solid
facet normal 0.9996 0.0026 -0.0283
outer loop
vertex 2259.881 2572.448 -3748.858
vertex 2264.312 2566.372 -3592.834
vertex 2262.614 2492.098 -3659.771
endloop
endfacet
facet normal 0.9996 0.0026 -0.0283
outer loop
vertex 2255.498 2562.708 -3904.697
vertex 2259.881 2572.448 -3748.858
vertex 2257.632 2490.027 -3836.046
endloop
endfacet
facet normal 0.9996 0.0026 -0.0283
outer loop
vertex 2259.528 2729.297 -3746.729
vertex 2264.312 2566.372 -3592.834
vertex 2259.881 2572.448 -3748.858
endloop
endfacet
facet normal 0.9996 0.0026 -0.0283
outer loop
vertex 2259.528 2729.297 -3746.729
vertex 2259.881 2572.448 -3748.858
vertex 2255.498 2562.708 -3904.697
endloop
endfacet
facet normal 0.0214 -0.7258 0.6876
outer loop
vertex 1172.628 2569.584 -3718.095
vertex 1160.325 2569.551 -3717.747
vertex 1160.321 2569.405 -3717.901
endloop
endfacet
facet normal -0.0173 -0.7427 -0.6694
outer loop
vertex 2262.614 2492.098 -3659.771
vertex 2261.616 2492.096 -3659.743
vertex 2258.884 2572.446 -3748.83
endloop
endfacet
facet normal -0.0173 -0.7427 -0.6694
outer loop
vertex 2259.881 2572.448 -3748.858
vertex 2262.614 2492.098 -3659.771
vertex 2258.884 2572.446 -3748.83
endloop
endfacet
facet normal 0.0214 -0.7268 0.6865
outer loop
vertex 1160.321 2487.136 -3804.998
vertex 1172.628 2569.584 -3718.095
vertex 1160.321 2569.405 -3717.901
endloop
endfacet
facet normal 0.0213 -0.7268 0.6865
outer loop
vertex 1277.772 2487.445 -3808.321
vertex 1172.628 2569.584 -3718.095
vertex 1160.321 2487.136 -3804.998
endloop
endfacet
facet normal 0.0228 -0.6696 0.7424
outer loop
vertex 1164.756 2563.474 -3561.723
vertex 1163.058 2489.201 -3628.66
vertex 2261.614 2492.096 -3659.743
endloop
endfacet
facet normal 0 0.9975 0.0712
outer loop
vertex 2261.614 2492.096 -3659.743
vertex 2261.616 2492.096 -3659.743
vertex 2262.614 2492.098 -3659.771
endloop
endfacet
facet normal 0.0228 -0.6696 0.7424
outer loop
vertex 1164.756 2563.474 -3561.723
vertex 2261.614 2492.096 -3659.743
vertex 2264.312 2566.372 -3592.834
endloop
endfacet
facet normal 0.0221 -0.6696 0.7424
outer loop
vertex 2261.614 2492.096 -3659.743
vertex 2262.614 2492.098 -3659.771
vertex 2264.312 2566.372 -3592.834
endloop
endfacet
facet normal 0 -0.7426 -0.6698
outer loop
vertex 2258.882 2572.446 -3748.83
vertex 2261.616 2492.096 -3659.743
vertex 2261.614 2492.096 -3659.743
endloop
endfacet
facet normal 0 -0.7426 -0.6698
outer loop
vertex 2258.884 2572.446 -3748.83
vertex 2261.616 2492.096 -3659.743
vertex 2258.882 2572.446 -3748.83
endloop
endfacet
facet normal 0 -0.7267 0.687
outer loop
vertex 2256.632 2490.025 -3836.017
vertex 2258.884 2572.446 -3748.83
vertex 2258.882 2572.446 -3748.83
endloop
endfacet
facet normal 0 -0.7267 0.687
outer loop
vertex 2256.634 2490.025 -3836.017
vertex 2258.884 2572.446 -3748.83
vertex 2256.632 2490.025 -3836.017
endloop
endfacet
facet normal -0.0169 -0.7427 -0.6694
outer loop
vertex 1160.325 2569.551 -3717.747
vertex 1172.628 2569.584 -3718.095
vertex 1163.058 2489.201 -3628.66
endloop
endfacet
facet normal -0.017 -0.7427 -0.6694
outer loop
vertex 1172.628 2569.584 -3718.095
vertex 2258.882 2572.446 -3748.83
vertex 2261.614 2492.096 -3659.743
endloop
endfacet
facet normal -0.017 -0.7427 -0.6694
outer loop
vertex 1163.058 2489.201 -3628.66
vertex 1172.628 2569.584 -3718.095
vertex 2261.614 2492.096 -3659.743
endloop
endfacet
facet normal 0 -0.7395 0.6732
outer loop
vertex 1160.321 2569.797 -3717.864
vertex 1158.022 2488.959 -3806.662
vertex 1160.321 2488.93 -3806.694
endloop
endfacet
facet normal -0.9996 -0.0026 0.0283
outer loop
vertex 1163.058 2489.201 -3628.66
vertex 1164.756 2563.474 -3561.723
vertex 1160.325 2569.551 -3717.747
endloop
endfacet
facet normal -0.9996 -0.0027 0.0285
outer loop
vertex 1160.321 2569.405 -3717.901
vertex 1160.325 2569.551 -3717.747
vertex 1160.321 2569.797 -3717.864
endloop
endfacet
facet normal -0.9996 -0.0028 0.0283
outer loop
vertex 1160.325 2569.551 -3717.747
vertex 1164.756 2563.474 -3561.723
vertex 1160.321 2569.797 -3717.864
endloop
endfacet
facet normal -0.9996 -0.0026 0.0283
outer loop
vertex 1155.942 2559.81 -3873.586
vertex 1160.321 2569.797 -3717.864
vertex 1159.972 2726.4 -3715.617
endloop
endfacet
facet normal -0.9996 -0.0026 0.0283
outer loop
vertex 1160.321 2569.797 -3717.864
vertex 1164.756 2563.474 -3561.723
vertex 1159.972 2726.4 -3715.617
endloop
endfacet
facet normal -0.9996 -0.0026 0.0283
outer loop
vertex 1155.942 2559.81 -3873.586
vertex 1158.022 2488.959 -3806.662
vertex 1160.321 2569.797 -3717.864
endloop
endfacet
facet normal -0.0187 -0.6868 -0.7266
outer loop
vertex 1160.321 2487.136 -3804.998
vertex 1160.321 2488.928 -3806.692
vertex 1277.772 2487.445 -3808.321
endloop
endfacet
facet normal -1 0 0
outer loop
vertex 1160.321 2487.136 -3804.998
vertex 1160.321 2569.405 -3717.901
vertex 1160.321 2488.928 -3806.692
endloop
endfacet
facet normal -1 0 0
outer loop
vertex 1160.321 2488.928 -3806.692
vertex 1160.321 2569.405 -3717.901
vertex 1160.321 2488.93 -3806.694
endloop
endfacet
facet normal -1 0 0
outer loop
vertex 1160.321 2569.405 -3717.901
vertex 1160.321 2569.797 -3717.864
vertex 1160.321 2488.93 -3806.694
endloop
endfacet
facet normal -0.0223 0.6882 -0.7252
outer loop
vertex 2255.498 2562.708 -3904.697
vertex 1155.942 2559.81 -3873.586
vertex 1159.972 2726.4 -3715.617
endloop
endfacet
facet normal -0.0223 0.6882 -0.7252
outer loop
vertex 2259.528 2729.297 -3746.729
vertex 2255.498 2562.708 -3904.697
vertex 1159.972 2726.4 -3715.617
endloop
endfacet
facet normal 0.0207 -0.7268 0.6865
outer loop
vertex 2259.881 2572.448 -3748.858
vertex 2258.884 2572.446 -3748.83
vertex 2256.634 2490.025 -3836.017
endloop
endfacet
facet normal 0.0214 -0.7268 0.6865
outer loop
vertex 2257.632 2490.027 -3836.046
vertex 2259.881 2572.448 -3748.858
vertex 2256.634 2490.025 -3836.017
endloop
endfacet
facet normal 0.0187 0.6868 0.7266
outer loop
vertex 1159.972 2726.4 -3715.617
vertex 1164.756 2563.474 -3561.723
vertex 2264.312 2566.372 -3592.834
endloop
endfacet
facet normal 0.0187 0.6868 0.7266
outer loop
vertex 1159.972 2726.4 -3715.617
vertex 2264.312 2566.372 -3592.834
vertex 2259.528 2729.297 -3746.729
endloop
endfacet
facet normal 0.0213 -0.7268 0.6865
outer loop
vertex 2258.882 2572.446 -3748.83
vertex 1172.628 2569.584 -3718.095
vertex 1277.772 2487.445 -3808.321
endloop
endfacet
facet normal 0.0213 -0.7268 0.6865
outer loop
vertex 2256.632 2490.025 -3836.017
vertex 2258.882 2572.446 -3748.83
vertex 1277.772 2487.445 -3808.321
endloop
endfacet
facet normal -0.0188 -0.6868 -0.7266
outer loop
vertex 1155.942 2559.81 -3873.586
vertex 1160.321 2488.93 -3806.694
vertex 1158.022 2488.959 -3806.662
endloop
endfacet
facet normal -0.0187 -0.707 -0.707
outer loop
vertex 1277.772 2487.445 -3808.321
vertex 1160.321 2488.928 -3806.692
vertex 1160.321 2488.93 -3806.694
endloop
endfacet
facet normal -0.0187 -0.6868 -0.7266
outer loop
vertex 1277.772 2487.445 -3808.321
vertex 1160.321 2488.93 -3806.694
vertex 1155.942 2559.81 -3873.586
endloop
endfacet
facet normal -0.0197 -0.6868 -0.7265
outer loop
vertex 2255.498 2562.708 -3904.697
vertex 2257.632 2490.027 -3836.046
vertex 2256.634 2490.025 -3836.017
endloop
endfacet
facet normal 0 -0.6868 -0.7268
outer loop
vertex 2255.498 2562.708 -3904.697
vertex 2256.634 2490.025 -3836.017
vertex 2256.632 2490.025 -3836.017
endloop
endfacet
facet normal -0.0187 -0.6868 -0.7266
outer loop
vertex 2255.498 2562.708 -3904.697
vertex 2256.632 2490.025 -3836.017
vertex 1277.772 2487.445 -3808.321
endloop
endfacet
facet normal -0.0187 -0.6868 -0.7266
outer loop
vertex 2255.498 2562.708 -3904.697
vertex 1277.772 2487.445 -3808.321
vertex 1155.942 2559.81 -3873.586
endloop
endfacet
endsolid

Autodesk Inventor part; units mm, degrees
sketch "Sketch1" plane through (0, 0, 0) normal (0, 0, 1) x (1, 0, 0)
  line L0 (2948.6488, 634.5525) -> (2841.4489, 559.4904)
  line L1 (2841.4489, 559.4904) -> (2956.2003, 395.6085)
  line L2 (2956.2003, 395.6085) -> (3063.4001, 470.6706)
  line L3 (1051.1773, 2444.1167) -> (976.8907, 2338.0244)
  line L4 (976.8907, 2338.0244) -> (1140.7211, 2223.3091)
  line L5 (1140.7211, 2223.3091) -> (1215.0077, 2329.4014)
  line L6 (-383.8501, 3232.1868) -> (-383.8501, 3052.6308)
  arc A0 (4065.9398, -2152.4924) -> (-383.8501, 3052.6308) centre (-4485.4868, -4958.3977) ccw
  arc A1 (1051.1773, 2444.1167) -> (-383.8501, 3232.1868) centre (-3980.604, -5017.8654) ccw
  arc A2 (2948.6488, 634.5525) -> (1215.0077, 2329.4014) centre (-4152.392, -4894.9339) ccw
  arc A3 (4300.883, -1939.8955) -> (3063.4001, 470.6706) centre (-4233.2291, -4798.0297) ccw
  arc A4 (4065.9398, -2152.4924) -> (4300.883, -1939.8955) centre (3657.2708, -1464.7499) ccw
  point P0 (0, 0)
  point P1 (4065.924, -2152.4924)
  point P2 (4065.924, -2152.4924)
  dimension "d8" = 9000
  dimension "d9" = 9000
  dimension "d10" = 9000
  dimension "d11" = 9000
  dimension "d12" = 800
ref_plane "Work Plane2" through (0, 0, -7900) normal (0, 0, 1) x (1, 0, 0)
ref_plane "Work Plane1" through (0, 0, 0) normal (0, 0, 1) x (1, 0, 0)
sketch "Sketch2" plane through (0, 0, -7900) normal (0, 0, 1) x (1, 0, 0)
  arc A0 (895.257, 3171.2695) -> (-383.8658, 4018.7524) centre (-4697.1096, -3880.3569) ccw projected
  line L0 (-383.8658, 4018.7524) -> (-383.8658, 3839.1061) projected
  arc A1 (4065.924, -2152.4924) -> (-383.8658, 3839.1061) centre (-4733.9746, -4039.7614) ccw projected
  line L1 (895.257, 3171.2695) -> (830.4728, 3059.0601) projected
  line L2 (830.4728, 3059.0601) -> (1003.6891, 2959.0536) projected
  line L3 (1068.4733, 3071.2631) -> (1003.6891, 2959.0536) projected
  arc A2 (2750.1419, 1279.62) -> (1068.4733, 3071.2631) centre (-4591.4319, -3926.2703) ccw projected
  line L4 (2750.1419, 1279.62) -> (2643.8882, 1205.2246) projected
  line L5 (2643.8882, 1205.2246) -> (2759.146, 1041.7698) projected
  line L6 (2865.5448, 1116.2711) -> (2759.146, 1041.7698) projected
  arc A3 (4310.9102, -1926.005) -> (2865.5448, 1116.2711) centre (-4397.3898, -4198.7812) ccw projected
  arc A4 (4065.924, -2152.4924) -> (4310.9102, -1926.005) centre (3657.2831, -1464.7333) ccw
  point P0 (0, 0)
  dimension "d7" = 800
loft "Loft1" add profiles "Sketch1", "Sketch2"
ref_plane "Work Plane3" through (2500, 0, 0) normal (1, 0, 0) x (0, 1, 0)
sketch "Sketch3" plane through (2500, 0, 0) normal (1, 0, 0) x (0, 1, 0)
  line L0 (2569.5835, -3718.0946) -> (1551.2045, -2616.5476)
  line L1 (1551.2045, -2616.5476) -> (1738.7871, -4630.7013)
  line L2 (1738.7871, -4630.7013) -> (2569.5835, -3718.0946)
  line L3 (4228.9662, 279.606) -> (-2269.9695, 279.606)
  line L4 (-2269.9695, 279.606) -> (-2269.9695, -8192.2559)
  line L5 (-2269.9695, -8192.2559) -> (4228.9662, -8192.2559)
  line L6 (4228.9662, -8192.2559) -> (4228.9662, 279.606)
  point P0 (0, 0)
extrude "Extrusion1" cut sketch "Sketch3" along normal through all both and the other way through all
ref_plane "Work Plane4" through (1945.737, 1551.2045, -2616.5476) normal (0, -0.9956912, -0.0927309) x (1, 0, 0)
sketch "Sketch5" plane through (1945.737, 1551.2045, -2616.5476) normal (0, -0.9956912, -0.0927309) x (1, 0, 0)
  line L0 (347.8734, 0) -> (290.3896, -2022.8698)
  point P0 (-1945.737, 2749.1181)
ref_plane "Work Plane5" through (2293.6104, 1551.2045, -2616.5476) normal (-0.6425282, -0.7644369, -0.052856) x (-0.0284055, 0.0926935, -0.9952894)
sketch "Sketch6" plane through (2293.6104, 1551.2045, -2616.5476) normal (-0.6425282, -0.7644369, -0.052856) x (-0.0284055, 0.0926935, -0.9952894)
  line L0 (-1061.9028, -2252.9112) -> (2197.0944, -2252.9112)
  line L1 (2197.0944, -2252.9112) -> (2197.0944, 343.7273)
  line L2 (2197.0944, 343.7273) -> (-1061.9028, 343.7273)
  line L3 (-1061.9028, 343.7273) -> (-1061.9028, -2252.9112)
  point P0 (-2682.8576, -979.2829)
extrude "Extrusion2" cut sketch "Sketch6" against normal through all
ref_plane "Work Plane6" through (2293.6104, 1551.2045, -2616.5476) normal (-0.9995965, -0.0026341, 0.0282831) x (-0.0284055, 0.0926935, -0.9952894)
sketch "Sketch7" plane through (2293.6104, 1551.2045, -2616.5476) normal (-0.6425282, -0.7644369, -0.052856) x (-0.0284055, 0.0926935, -0.9952894)
  line L0 (0, 0) -> (1222.5973, -1418.5767) projected
  line L1 (1222.5973, -1418.5767) -> (2023.6864, 0) projected
  point P0 (-2682.8576, -979.2829)
sketch "Sketch8" plane through (2293.6104, 1551.2045, -2616.5476) normal (-0.9995965, -0.0026341, 0.0282831) x (-0.0284055, 0.0926935, -0.9952894)
  line L0 (0, 0) -> (1222.5973, -911.8435) projected
  spline S0 degree 4 poles (2023.6864, 0) (1891.4174, -0.0605) (1759.1485, -0.1112) (1626.8795, -0.1518) (1361.543, -0.2126) (1228.4756, -0.2325) (1095.4081, -0.2417) (831.8573, -0.2379) (701.374, -0.2253) (570.8907, -0.2017) (330.3055, -0.1374) (220.2037, -0.0999) (110.1018, -0.0542) (0, 0) knots 0 0 0 0 0 0.261442 0.261442 0.261442 0.524462 0.524462 0.524462 0.782374 0.782374 0.782374 1 1 1 1 1 projected
  line L1 (1222.5973, -911.8435) -> (2023.6864, 0) projected
  point P0 (-2682.8576, 1301.8858)
sketch "Sketch9" plane through (2293.6104, 1551.2045, -2616.5476) normal (-0.9995965, -0.0026341, 0.0282831) x (-0.0284055, 0.0926935, -0.9952894)
  line L0 (1222.5973, -911.8435) -> (0, 0) projected
  line L1 (2023.6864, 0) -> (1222.5973, -911.8435) projected
  spline S0 degree 4 poles (0, 0) (253.1862, 0) (506.3724, 0) (759.5586, 0) (1265.4802, 0) (1518.2156, 0) (1770.951, 0) (2023.6864, 0) knots 0 0 0 0 0 0.500446 0.500446 0.500446 1 1 1 1 1 projected
  point P0 (-2682.8576, 1301.8858)
extrude "Extrusion3" add sketch "Sketch9" against normal blind 1
sketch "Sketch10" plane through (2294.61, 1551.2071, -2616.5759) normal (0.9995965, 0.0026341, -0.0282831) x (-0.0284055, 0.0926935, -0.9952894)
  line L0 (1222.5973, 911.8435) -> (2011.6459, 13.7052) projected
  line L1 (1222.5973, 911.8435) -> (1126.4049, 840.1008)
  line L2 (0, 0) -> (1222.5973, 911.8435) projected
  line L3 (1222.5973, 911.8435) -> (1301.7983, 821.6925)
  line L4 (1301.7983, 821.6925) -> (1376.9241, 887.6934)
  line L5 (1376.9241, 887.6934) -> (1235.027, 1068.2138)
  line L6 (1126.4049, 840.1008) -> (1066.6193, 920.2612)
  line L7 (1066.6193, 920.2612) -> (1235.027, 1068.2138)
  point P0 (-2682.8576, -1301.8858)
  dimension "d31" = 120
  dimension "d32" = 120
  dimension "d33" = 100
  dimension "d34" = 100
extrude "Extrusion5" add sketch "Sketch10" against normal blind 1100
sketch "Sketch16" plane through (2294.61, 1551.2071, -2616.5759) normal (0.9995965, 0.0026341, -0.0282831) x (-0.0284055, 0.0926935, -0.9952894)
  line L0 (0, 0) -> (1126.4049, 840.1008) projected
  line L1 (1020.1978, 760.8889) -> (1222.5973, 911.8435)
  line L2 (0, 0) -> (-179.2361, -133.6787)
  line L3 (-179.2361, -133.6787) -> (2478.6059, -144.4888)
  line L4 (2478.6059, -144.4888) -> (2023.6864, 0)
  line L5 (1305.5559, 824.9938) -> (1226.6196, 914.8434)
  line L6 (1222.5973, 911.8435) -> (1226.6196, 914.8434)
  point P0 (-2682.8576, -1301.8858)
extrude "Extrusion6" cut sketch "Sketch8" along normal blind 2000
sketch "Sketch17" plane through (2256.6322, 2490.0248, -3836.0174) normal (0.0213399, -0.7268016, 0.6865159) x (0.9995965, 0.0026341, -0.0282831)
  line L0 (0, 0) -> (-979.255, 0) projected
  line L1 (-1518.239, 0) -> (548.3239, 0)
  line L2 (548.3239, 0) -> (548.3239, -1298.4887)
  line L3 (548.3239, -1298.4887) -> (-1518.239, -1298.4887)
  line L4 (-1518.239, -1298.4887) -> (-1518.239, 0)
  point P0 (-2370.775, 1034.5522)
  point P1 (-1213.4732, 0)
  point P2 (-1999, 0)
extrude "Extrusion7" cut sketch "Sketch17" along normal mid plane 5000
sketch "Sketch18" plane through (2294.61, 1551.2071, -2616.5759) normal (0.9995965, 0.0026341, -0.0282831) x (-0.0284055, 0.0926935, -0.9952894)
  line L0 (1126.4049, 840.1008) -> (1222.5973, 911.8435) projected
  line L1 (1301.7983, 821.6925) -> (366.6688, 0.1458) projected
  spline S0 degree 4 poles (366.6688, 0.1458) (275.0016, 0.1179) (183.3344, 0.0844) (91.6672, 0.0451) (0, 0) knots 0 0 0 0 0 1 1 1 1 1 projected
  line L2 (0, 0) -> (1126.4049, 840.1008) projected
  line L3 (1126.4049, 840.1008) -> (1222.5973, 911.8435) projected
  line L4 (1222.5973, 911.8435) -> (1301.7983, 821.6925) projected
  point P0 (-2682.8576, -1301.8858)
  point P1 (1126.4049, 840.1008)
extrude "Extrusion8" cut sketch "Sketch18" along normal mid plane 5000
sketch "Sketch19" plane through (1945.737, 1551.2045, -2616.5476) normal (0, -0.9956912, -0.0927309) x (1, 0, 0)
  line L0 (407.6375, 227.4777) -> (-99.9449, 227.4777)
  line L1 (-99.9449, 227.4777) -> (-99.9449, -459.2513)
  line L2 (-99.9449, -459.2513) -> (407.6375, -459.2513)
  line L3 (407.6375, -459.2513) -> (407.6375, 227.4777)
  point P0 (-1945.737, 2749.1181)
extrude "Extrusion9" cut sketch "Sketch19" along normal mid plane 100
sketch "Sketch20" plane through (929.9316, 2569.5835, -3718.0946) normal (0, 0.7394745, -0.6731846) x (1, 0, 0)
  line L0 (3.9942, -0.4392) -> (230.3898, -0.0226) projected
  line L1 (-207.8079, -0.0226) -> (-207.8079, 338.0495)
  line L2 (-207.8079, 338.0495) -> (230.3898, 338.0495)
  line L3 (230.3898, 338.0495) -> (230.3898, -0.0226)
  line L4 (-207.8079, -0.0226) -> (-207.8079, -237.6599)
  line L5 (-207.8079, -237.6599) -> (230.3898, -237.6599)
  line L6 (230.3898, -237.6599) -> (230.3898, 129.1543)
  point P0 (-929.9316, -1019.6322)
extrude "Extrusion10" cut sketch "Sketch20" against normal blind 1100
properties part number "panel_block_02" material "Wood (Maple)"
